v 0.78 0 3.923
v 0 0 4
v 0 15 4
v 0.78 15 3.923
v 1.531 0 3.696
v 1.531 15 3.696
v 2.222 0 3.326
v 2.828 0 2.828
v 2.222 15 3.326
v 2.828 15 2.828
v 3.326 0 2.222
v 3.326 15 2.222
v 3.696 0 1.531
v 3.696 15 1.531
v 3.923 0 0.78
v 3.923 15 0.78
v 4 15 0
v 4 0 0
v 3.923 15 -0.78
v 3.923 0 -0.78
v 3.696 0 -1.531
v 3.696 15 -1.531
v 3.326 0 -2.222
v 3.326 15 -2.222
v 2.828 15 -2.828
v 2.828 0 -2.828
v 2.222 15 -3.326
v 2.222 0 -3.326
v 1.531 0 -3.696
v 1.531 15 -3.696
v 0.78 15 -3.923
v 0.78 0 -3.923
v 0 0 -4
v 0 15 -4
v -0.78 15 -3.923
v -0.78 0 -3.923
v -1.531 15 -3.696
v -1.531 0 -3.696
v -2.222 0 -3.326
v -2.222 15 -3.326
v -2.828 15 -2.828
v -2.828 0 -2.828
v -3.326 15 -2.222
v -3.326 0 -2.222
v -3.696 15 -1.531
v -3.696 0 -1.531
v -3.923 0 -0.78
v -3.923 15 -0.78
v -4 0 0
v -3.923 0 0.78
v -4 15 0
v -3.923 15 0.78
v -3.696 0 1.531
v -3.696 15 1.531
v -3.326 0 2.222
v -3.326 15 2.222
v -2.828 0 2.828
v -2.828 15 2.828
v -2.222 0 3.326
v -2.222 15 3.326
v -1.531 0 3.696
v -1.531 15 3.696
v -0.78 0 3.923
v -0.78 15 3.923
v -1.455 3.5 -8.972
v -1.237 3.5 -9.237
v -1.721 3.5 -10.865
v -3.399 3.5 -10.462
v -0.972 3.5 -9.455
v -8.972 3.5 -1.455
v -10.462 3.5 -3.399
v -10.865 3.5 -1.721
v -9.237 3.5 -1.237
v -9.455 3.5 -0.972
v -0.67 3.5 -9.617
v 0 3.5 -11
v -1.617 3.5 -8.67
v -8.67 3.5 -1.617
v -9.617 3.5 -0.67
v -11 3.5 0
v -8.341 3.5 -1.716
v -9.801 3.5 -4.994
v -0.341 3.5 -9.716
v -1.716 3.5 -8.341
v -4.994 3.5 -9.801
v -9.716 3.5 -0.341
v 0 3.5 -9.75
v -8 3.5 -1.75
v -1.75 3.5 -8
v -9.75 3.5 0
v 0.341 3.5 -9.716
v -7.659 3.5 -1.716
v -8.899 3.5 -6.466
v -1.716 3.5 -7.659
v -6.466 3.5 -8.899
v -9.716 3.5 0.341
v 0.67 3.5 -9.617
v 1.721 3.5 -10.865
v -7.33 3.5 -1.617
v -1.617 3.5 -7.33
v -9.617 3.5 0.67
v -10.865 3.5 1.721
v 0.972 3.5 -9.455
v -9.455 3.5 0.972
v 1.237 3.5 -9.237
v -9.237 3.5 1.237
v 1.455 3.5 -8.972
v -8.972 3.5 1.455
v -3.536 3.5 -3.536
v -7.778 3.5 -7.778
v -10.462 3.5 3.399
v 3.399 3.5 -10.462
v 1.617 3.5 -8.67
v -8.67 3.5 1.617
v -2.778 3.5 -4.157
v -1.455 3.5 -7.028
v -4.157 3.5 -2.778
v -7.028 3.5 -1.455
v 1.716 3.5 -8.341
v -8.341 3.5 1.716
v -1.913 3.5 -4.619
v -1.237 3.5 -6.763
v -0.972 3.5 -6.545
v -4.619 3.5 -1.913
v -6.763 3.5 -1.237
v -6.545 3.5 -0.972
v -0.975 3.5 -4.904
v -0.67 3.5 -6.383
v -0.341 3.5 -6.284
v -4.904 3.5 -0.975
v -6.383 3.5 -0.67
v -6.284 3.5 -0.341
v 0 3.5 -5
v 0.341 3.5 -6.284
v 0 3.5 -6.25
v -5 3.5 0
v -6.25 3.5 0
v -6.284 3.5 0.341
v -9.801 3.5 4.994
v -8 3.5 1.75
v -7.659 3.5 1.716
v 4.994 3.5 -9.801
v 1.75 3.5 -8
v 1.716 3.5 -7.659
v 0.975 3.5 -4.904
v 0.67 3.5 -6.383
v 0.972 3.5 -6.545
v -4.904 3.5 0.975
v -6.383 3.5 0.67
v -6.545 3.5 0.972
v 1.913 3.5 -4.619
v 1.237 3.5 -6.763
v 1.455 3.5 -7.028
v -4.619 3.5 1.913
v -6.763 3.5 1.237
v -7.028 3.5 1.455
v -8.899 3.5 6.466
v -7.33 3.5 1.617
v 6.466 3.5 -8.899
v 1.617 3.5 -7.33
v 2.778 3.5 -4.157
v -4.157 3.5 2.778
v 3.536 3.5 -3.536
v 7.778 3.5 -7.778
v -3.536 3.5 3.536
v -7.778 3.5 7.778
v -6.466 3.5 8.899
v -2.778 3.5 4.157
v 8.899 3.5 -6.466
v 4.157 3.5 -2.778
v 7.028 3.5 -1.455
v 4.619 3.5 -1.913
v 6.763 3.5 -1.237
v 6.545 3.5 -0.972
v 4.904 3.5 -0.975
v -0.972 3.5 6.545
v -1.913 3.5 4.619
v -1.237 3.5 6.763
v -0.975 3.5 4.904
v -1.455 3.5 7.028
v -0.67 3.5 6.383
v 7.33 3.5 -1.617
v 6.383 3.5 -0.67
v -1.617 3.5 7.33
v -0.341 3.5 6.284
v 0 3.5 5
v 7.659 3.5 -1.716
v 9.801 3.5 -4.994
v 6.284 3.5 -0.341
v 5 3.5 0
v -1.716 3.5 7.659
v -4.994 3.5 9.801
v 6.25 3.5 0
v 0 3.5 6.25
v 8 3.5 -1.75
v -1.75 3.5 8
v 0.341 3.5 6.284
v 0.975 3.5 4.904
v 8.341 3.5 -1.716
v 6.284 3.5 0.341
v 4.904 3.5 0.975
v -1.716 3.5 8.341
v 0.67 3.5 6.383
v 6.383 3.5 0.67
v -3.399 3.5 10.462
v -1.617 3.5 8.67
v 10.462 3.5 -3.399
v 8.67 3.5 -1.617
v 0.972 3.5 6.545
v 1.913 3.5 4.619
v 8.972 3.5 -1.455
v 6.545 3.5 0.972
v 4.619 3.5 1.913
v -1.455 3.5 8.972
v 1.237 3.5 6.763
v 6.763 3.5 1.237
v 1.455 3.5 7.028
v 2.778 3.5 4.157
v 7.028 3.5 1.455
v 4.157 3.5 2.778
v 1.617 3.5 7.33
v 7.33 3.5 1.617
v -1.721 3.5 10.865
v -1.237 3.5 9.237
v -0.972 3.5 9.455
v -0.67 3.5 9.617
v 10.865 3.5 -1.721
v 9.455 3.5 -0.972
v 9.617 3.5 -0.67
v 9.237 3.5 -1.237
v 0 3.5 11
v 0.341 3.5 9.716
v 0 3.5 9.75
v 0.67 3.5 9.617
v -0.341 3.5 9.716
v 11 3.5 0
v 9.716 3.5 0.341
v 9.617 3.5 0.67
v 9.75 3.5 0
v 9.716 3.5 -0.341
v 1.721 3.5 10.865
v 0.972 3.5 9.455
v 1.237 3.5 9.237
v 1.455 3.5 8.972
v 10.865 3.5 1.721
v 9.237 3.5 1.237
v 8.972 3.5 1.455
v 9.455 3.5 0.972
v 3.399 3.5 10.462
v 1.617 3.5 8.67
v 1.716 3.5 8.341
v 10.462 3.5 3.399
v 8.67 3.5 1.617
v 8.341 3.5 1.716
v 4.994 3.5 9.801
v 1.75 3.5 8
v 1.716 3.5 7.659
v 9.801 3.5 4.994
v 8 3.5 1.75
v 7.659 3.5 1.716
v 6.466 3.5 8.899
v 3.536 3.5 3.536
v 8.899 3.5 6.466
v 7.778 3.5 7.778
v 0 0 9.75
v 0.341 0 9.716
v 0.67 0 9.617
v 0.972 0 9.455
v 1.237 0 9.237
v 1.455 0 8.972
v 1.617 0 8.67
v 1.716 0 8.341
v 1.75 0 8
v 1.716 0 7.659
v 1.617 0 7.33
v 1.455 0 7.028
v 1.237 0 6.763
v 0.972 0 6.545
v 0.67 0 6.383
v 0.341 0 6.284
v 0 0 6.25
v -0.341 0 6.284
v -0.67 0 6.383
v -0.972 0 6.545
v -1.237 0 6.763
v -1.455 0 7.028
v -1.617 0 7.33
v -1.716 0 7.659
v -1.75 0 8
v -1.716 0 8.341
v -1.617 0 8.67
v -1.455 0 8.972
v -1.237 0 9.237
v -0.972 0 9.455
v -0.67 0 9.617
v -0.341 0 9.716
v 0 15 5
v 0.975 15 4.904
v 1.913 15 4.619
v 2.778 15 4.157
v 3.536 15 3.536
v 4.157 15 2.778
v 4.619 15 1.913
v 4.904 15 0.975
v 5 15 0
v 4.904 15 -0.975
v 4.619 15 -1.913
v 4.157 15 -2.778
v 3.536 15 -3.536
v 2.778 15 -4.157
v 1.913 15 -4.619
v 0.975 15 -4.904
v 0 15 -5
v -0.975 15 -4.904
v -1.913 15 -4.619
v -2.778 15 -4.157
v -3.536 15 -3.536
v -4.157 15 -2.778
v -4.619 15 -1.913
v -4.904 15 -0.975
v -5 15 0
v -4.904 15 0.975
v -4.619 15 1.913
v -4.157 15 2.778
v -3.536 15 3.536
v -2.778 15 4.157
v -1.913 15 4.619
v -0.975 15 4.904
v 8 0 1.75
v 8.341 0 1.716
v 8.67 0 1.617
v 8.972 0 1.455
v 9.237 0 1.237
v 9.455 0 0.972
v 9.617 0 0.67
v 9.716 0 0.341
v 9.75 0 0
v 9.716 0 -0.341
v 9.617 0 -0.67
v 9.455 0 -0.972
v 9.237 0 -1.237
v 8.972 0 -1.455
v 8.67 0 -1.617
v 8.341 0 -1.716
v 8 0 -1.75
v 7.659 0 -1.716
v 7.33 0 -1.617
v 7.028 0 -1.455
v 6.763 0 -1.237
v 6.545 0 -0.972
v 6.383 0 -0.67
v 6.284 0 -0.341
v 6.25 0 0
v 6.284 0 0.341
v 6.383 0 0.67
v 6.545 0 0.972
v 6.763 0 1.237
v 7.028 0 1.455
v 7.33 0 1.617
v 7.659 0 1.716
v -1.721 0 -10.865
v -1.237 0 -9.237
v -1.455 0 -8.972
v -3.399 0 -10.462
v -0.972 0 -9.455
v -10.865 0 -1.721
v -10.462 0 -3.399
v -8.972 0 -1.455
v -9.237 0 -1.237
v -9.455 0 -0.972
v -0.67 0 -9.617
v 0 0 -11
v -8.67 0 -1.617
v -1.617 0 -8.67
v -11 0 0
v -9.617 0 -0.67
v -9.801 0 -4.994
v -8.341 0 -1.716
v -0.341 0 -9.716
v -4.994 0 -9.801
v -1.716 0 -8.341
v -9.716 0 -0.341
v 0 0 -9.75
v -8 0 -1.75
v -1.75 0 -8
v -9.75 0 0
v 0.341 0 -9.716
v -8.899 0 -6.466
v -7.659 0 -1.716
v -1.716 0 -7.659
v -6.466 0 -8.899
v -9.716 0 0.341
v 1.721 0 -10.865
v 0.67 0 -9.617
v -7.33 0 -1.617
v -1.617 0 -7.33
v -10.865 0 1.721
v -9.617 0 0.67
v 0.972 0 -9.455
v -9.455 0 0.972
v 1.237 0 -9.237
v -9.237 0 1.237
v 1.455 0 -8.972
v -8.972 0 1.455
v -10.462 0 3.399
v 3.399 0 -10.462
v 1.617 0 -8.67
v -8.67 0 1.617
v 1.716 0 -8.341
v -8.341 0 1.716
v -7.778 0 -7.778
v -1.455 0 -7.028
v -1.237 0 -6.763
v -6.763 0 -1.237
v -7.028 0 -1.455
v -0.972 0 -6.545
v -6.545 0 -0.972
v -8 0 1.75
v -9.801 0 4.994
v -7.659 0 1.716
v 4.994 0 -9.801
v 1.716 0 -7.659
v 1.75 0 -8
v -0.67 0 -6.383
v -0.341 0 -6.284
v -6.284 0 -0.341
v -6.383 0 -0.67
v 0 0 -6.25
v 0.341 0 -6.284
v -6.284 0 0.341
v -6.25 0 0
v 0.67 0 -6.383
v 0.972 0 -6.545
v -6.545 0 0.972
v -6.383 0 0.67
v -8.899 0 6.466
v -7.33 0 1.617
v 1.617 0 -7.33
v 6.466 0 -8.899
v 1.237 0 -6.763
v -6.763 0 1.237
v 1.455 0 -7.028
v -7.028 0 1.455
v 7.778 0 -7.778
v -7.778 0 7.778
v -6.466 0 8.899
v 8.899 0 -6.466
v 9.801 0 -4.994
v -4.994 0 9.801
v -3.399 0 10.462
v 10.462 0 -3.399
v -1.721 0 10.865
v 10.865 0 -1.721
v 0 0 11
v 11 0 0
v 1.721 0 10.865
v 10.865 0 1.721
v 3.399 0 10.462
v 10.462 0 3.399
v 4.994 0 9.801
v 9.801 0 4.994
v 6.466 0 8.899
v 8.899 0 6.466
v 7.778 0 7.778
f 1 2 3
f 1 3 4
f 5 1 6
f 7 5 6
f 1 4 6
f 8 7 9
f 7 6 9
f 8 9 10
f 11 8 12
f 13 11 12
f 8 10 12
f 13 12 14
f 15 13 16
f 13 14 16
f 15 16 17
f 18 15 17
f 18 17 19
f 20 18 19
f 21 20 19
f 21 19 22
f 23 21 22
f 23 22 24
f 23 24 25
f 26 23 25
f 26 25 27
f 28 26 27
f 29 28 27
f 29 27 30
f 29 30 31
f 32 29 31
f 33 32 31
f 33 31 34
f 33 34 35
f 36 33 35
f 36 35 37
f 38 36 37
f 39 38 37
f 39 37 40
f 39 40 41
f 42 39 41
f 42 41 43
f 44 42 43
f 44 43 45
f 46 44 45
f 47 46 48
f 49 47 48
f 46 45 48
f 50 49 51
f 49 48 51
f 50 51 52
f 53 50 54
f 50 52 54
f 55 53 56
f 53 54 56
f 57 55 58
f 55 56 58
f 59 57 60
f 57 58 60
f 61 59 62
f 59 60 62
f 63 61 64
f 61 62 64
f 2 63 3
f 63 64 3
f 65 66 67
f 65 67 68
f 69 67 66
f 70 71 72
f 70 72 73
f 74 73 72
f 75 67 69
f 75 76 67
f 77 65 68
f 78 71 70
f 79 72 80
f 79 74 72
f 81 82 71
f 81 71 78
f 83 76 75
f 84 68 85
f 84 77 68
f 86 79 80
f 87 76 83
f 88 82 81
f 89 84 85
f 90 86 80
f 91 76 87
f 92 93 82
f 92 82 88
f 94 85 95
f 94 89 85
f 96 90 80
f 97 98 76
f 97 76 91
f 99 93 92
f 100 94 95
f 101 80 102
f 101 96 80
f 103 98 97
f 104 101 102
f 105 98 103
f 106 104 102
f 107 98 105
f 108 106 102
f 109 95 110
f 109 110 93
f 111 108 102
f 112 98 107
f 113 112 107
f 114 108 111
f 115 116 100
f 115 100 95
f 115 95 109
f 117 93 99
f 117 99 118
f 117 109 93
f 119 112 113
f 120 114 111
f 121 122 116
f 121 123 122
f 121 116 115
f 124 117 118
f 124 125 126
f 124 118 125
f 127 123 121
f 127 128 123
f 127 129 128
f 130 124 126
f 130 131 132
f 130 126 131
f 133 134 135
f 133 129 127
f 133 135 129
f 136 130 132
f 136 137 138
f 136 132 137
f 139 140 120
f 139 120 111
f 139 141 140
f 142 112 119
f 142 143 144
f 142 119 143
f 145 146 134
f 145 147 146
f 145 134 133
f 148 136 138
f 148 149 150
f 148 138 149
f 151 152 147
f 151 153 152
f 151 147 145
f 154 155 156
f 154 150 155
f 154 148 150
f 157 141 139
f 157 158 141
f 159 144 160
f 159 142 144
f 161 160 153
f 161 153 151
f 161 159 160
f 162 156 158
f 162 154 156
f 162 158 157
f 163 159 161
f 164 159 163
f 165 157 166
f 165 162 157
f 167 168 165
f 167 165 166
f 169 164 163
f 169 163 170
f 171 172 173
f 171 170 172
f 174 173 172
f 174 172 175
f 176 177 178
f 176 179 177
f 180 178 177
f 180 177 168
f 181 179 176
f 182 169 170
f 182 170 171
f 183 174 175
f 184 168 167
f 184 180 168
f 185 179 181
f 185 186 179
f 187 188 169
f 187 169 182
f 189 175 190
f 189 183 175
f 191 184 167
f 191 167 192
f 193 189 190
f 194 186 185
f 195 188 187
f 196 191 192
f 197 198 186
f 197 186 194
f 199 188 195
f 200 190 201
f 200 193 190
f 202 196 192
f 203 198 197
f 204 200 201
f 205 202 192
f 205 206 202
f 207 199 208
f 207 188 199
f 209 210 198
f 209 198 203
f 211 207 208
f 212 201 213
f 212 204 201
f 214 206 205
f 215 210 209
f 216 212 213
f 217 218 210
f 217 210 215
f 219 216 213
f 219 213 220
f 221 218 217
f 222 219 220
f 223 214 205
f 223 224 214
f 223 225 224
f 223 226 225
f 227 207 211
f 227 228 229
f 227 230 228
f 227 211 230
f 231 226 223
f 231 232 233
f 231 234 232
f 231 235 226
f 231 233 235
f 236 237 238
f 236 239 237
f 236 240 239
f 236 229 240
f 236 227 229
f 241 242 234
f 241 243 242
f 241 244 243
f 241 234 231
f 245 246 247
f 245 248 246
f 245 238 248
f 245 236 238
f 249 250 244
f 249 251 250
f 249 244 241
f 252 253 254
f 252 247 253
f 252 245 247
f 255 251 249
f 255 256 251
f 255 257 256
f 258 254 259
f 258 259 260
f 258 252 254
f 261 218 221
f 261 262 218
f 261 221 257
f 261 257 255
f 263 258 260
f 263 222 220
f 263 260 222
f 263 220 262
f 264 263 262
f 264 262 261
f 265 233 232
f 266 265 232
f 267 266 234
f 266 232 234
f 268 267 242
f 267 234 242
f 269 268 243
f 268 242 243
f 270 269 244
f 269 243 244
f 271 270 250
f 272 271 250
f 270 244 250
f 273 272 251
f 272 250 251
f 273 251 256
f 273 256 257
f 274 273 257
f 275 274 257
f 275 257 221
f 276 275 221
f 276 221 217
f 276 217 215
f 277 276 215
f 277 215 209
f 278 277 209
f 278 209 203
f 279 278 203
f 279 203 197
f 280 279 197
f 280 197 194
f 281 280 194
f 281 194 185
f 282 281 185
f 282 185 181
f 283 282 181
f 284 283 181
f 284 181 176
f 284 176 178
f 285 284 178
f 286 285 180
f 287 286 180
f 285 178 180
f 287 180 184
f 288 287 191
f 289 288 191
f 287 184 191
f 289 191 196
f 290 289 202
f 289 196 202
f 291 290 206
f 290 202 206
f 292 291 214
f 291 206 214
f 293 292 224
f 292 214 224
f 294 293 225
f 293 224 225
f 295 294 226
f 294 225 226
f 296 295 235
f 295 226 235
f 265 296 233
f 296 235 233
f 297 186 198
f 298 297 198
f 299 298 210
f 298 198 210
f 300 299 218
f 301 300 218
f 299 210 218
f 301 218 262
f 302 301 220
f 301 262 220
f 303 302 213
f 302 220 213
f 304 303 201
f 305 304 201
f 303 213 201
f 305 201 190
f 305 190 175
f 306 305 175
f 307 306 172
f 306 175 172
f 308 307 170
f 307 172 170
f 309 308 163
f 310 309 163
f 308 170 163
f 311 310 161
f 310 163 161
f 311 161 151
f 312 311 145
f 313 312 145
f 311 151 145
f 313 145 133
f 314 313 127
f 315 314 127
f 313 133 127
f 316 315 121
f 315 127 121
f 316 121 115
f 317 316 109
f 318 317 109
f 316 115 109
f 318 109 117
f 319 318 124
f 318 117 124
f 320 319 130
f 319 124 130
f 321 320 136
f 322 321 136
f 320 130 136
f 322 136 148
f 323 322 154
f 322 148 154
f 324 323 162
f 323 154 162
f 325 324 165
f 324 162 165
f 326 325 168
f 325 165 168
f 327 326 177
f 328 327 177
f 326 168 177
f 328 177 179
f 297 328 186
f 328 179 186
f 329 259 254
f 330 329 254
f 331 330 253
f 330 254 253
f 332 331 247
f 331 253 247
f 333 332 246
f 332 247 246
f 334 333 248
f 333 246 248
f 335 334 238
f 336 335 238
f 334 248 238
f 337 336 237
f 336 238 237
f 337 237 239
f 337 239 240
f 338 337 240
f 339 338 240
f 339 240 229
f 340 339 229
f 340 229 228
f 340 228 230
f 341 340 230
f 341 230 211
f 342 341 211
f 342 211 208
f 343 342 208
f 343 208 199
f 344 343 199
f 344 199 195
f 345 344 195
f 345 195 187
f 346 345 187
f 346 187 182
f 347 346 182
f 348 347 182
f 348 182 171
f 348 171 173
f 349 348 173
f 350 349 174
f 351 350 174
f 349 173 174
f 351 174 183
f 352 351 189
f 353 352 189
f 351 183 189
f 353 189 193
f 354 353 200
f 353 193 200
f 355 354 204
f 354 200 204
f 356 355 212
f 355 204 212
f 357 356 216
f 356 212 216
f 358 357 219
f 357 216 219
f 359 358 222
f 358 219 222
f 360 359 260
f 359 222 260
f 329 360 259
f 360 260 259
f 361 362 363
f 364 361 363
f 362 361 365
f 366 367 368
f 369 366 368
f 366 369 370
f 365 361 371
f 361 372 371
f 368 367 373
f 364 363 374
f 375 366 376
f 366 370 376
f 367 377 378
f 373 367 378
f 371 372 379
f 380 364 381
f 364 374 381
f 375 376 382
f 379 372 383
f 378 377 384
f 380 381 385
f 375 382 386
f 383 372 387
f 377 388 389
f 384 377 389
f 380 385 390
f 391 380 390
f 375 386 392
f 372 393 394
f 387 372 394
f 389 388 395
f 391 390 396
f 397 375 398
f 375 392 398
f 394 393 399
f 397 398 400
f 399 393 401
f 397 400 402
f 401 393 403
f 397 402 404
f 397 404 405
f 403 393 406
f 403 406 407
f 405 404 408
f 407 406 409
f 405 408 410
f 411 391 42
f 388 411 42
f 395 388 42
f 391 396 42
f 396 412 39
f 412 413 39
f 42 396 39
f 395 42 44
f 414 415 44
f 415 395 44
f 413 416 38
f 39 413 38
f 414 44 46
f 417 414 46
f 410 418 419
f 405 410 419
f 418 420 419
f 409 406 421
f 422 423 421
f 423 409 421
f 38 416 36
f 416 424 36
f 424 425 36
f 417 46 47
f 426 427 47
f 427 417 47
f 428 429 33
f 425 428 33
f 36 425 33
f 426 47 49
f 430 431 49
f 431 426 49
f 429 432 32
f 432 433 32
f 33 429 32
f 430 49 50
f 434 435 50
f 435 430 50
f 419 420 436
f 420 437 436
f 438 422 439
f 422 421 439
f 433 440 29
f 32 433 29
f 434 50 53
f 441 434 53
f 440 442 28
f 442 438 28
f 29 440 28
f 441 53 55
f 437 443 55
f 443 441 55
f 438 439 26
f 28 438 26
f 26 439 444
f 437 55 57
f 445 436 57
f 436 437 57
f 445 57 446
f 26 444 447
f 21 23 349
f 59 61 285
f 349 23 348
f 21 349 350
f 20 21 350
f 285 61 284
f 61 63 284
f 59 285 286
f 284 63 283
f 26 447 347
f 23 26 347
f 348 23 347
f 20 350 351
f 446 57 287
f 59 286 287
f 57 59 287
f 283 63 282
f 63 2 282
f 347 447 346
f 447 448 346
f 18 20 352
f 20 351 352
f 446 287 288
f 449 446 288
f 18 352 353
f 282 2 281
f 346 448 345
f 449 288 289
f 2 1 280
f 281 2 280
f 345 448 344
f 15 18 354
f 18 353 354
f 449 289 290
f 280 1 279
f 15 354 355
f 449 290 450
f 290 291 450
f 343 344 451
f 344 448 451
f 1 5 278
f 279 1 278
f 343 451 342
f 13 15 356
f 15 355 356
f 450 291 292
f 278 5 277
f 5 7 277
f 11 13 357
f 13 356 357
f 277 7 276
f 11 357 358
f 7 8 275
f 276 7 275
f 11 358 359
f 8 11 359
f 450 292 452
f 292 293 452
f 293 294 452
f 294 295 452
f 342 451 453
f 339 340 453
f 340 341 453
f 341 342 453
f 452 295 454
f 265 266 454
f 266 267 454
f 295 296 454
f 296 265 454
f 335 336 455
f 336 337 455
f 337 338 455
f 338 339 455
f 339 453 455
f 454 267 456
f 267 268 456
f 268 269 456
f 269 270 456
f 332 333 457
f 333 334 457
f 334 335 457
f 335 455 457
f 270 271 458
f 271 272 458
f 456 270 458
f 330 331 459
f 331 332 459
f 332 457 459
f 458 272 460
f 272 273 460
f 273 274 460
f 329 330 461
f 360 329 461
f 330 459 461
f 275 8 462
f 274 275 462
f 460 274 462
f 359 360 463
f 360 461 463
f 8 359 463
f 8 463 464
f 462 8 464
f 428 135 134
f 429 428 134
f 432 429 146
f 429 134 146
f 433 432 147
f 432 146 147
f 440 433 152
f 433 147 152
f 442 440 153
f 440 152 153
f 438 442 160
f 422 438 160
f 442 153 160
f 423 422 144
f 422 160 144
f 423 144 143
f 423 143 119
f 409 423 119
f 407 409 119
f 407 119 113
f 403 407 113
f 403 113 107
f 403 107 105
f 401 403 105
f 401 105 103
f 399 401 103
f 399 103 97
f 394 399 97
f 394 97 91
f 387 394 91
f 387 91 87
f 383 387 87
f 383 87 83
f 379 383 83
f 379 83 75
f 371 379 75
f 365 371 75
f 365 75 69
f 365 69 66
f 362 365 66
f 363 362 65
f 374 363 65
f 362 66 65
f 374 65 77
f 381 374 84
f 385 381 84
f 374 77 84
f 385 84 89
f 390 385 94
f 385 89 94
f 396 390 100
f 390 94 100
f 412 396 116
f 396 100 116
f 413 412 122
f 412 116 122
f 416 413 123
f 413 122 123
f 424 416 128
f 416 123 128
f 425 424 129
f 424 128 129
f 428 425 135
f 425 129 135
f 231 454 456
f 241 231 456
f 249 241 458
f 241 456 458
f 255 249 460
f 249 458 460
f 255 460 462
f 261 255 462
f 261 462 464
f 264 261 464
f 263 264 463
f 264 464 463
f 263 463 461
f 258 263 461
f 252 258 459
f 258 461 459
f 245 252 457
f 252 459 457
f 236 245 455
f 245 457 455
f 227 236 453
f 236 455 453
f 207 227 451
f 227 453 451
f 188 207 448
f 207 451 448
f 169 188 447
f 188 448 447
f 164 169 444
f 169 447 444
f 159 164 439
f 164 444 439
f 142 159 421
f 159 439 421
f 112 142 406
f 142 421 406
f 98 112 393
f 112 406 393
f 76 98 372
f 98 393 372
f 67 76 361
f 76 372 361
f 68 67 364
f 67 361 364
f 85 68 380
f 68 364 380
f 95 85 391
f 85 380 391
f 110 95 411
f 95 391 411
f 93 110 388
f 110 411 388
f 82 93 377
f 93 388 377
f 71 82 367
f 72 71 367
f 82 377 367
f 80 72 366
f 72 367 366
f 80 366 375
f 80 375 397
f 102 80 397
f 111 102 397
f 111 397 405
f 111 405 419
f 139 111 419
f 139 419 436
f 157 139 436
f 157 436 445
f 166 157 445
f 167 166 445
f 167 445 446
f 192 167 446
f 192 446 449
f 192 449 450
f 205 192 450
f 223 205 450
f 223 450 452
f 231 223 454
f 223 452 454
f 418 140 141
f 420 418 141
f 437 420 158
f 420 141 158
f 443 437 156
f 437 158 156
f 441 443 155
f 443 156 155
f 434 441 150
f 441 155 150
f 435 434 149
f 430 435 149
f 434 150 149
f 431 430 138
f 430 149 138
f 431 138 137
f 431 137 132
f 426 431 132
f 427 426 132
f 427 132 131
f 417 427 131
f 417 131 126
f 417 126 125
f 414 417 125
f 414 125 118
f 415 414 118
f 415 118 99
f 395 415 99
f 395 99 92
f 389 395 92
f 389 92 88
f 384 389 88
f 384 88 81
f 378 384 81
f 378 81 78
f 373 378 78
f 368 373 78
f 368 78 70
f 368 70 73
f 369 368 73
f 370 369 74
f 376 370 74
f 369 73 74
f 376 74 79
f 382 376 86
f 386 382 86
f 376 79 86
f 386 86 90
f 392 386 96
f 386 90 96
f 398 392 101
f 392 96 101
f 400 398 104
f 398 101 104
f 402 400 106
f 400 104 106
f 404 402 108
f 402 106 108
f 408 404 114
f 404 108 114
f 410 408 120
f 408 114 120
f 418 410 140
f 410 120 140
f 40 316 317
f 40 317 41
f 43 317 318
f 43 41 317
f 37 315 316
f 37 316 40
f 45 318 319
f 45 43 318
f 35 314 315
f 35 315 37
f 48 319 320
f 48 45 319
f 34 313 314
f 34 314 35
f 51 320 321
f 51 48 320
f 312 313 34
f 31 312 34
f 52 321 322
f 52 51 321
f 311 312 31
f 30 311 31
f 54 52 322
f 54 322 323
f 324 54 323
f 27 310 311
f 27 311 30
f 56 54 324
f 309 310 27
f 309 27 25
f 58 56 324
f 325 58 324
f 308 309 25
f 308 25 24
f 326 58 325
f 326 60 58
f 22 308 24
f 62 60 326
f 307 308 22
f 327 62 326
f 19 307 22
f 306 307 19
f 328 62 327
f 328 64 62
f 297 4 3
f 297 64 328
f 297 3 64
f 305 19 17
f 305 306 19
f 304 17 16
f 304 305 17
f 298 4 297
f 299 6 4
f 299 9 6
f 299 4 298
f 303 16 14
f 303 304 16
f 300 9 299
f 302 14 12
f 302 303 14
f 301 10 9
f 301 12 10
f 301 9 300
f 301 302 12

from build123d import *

# Parameters (mm, degrees)
SKETCH_1_R          = 11
EXTRUDE_1_DEPTH     = 3.5
SKETCH_2_R          = 5
EXTRUDE_2_DEPTH     = 11.5
SKETCH_3_R          = 4
CUT_EXTRUDE_1_DEPTH = 22.610182785
SKETCH_4_R          = 1.75
CUT_EXTRUDE_2_DEPTH = 20.345542122


with BuildPart() as part:
    # 草图1 → 凸台-拉伸1 (new body)
    with BuildSketch(Plane(origin=(0, 0, 0), x_dir=(1, 0, 0), z_dir=(0, 1, 0))):
        with Locations(Location((0, 0, 0), (0, 0, 270))):
            Circle(SKETCH_1_R)
    extrude(amount=EXTRUDE_1_DEPTH)

    # 草图2 → 凸台-拉伸2 (add)
    with BuildSketch(Plane(origin=(0, 3.5, 0), x_dir=(1, 0, 0), z_dir=(0, 1, 0))):
        with Locations(Location((0, 0, 0), (0, 0, 270))):
            Circle(SKETCH_2_R)
    extrude(amount=EXTRUDE_2_DEPTH)

    # 草图3 → 切除-拉伸1 (cut, through all)
    with BuildSketch(Plane(origin=(0, 15, 0), x_dir=(1, 0, 0), z_dir=(0, 1, 0))):
        with Locations(Location((0, 0, 0), (0, 0, 270))):
            Circle(SKETCH_3_R)
    extrude(amount=-CUT_EXTRUDE_1_DEPTH, mode=Mode.SUBTRACT)

    # 草图4 → 切除-拉伸2 (cut, through all)
    with BuildSketch(Plane(origin=(0, 3.5, 0), x_dir=(1, 0, 0), z_dir=(0, 1, 0))):
        with Locations(Location((0, 8, 0), (0, 0, 270))):
            Circle(SKETCH_4_R)
        with Locations(Location((8, 0, 0), (0, 0, 270))):
            Circle(SKETCH_4_R)
        with Locations(Location((0, -8, 0), (0, 0, 270))):
            Circle(SKETCH_4_R)
        with Locations(Location((-8, 0, 0), (0, 0, 270))):
            Circle(SKETCH_4_R)
    extrude(amount=-CUT_EXTRUDE_2_DEPTH, mode=Mode.SUBTRACT)


solid = part.part
